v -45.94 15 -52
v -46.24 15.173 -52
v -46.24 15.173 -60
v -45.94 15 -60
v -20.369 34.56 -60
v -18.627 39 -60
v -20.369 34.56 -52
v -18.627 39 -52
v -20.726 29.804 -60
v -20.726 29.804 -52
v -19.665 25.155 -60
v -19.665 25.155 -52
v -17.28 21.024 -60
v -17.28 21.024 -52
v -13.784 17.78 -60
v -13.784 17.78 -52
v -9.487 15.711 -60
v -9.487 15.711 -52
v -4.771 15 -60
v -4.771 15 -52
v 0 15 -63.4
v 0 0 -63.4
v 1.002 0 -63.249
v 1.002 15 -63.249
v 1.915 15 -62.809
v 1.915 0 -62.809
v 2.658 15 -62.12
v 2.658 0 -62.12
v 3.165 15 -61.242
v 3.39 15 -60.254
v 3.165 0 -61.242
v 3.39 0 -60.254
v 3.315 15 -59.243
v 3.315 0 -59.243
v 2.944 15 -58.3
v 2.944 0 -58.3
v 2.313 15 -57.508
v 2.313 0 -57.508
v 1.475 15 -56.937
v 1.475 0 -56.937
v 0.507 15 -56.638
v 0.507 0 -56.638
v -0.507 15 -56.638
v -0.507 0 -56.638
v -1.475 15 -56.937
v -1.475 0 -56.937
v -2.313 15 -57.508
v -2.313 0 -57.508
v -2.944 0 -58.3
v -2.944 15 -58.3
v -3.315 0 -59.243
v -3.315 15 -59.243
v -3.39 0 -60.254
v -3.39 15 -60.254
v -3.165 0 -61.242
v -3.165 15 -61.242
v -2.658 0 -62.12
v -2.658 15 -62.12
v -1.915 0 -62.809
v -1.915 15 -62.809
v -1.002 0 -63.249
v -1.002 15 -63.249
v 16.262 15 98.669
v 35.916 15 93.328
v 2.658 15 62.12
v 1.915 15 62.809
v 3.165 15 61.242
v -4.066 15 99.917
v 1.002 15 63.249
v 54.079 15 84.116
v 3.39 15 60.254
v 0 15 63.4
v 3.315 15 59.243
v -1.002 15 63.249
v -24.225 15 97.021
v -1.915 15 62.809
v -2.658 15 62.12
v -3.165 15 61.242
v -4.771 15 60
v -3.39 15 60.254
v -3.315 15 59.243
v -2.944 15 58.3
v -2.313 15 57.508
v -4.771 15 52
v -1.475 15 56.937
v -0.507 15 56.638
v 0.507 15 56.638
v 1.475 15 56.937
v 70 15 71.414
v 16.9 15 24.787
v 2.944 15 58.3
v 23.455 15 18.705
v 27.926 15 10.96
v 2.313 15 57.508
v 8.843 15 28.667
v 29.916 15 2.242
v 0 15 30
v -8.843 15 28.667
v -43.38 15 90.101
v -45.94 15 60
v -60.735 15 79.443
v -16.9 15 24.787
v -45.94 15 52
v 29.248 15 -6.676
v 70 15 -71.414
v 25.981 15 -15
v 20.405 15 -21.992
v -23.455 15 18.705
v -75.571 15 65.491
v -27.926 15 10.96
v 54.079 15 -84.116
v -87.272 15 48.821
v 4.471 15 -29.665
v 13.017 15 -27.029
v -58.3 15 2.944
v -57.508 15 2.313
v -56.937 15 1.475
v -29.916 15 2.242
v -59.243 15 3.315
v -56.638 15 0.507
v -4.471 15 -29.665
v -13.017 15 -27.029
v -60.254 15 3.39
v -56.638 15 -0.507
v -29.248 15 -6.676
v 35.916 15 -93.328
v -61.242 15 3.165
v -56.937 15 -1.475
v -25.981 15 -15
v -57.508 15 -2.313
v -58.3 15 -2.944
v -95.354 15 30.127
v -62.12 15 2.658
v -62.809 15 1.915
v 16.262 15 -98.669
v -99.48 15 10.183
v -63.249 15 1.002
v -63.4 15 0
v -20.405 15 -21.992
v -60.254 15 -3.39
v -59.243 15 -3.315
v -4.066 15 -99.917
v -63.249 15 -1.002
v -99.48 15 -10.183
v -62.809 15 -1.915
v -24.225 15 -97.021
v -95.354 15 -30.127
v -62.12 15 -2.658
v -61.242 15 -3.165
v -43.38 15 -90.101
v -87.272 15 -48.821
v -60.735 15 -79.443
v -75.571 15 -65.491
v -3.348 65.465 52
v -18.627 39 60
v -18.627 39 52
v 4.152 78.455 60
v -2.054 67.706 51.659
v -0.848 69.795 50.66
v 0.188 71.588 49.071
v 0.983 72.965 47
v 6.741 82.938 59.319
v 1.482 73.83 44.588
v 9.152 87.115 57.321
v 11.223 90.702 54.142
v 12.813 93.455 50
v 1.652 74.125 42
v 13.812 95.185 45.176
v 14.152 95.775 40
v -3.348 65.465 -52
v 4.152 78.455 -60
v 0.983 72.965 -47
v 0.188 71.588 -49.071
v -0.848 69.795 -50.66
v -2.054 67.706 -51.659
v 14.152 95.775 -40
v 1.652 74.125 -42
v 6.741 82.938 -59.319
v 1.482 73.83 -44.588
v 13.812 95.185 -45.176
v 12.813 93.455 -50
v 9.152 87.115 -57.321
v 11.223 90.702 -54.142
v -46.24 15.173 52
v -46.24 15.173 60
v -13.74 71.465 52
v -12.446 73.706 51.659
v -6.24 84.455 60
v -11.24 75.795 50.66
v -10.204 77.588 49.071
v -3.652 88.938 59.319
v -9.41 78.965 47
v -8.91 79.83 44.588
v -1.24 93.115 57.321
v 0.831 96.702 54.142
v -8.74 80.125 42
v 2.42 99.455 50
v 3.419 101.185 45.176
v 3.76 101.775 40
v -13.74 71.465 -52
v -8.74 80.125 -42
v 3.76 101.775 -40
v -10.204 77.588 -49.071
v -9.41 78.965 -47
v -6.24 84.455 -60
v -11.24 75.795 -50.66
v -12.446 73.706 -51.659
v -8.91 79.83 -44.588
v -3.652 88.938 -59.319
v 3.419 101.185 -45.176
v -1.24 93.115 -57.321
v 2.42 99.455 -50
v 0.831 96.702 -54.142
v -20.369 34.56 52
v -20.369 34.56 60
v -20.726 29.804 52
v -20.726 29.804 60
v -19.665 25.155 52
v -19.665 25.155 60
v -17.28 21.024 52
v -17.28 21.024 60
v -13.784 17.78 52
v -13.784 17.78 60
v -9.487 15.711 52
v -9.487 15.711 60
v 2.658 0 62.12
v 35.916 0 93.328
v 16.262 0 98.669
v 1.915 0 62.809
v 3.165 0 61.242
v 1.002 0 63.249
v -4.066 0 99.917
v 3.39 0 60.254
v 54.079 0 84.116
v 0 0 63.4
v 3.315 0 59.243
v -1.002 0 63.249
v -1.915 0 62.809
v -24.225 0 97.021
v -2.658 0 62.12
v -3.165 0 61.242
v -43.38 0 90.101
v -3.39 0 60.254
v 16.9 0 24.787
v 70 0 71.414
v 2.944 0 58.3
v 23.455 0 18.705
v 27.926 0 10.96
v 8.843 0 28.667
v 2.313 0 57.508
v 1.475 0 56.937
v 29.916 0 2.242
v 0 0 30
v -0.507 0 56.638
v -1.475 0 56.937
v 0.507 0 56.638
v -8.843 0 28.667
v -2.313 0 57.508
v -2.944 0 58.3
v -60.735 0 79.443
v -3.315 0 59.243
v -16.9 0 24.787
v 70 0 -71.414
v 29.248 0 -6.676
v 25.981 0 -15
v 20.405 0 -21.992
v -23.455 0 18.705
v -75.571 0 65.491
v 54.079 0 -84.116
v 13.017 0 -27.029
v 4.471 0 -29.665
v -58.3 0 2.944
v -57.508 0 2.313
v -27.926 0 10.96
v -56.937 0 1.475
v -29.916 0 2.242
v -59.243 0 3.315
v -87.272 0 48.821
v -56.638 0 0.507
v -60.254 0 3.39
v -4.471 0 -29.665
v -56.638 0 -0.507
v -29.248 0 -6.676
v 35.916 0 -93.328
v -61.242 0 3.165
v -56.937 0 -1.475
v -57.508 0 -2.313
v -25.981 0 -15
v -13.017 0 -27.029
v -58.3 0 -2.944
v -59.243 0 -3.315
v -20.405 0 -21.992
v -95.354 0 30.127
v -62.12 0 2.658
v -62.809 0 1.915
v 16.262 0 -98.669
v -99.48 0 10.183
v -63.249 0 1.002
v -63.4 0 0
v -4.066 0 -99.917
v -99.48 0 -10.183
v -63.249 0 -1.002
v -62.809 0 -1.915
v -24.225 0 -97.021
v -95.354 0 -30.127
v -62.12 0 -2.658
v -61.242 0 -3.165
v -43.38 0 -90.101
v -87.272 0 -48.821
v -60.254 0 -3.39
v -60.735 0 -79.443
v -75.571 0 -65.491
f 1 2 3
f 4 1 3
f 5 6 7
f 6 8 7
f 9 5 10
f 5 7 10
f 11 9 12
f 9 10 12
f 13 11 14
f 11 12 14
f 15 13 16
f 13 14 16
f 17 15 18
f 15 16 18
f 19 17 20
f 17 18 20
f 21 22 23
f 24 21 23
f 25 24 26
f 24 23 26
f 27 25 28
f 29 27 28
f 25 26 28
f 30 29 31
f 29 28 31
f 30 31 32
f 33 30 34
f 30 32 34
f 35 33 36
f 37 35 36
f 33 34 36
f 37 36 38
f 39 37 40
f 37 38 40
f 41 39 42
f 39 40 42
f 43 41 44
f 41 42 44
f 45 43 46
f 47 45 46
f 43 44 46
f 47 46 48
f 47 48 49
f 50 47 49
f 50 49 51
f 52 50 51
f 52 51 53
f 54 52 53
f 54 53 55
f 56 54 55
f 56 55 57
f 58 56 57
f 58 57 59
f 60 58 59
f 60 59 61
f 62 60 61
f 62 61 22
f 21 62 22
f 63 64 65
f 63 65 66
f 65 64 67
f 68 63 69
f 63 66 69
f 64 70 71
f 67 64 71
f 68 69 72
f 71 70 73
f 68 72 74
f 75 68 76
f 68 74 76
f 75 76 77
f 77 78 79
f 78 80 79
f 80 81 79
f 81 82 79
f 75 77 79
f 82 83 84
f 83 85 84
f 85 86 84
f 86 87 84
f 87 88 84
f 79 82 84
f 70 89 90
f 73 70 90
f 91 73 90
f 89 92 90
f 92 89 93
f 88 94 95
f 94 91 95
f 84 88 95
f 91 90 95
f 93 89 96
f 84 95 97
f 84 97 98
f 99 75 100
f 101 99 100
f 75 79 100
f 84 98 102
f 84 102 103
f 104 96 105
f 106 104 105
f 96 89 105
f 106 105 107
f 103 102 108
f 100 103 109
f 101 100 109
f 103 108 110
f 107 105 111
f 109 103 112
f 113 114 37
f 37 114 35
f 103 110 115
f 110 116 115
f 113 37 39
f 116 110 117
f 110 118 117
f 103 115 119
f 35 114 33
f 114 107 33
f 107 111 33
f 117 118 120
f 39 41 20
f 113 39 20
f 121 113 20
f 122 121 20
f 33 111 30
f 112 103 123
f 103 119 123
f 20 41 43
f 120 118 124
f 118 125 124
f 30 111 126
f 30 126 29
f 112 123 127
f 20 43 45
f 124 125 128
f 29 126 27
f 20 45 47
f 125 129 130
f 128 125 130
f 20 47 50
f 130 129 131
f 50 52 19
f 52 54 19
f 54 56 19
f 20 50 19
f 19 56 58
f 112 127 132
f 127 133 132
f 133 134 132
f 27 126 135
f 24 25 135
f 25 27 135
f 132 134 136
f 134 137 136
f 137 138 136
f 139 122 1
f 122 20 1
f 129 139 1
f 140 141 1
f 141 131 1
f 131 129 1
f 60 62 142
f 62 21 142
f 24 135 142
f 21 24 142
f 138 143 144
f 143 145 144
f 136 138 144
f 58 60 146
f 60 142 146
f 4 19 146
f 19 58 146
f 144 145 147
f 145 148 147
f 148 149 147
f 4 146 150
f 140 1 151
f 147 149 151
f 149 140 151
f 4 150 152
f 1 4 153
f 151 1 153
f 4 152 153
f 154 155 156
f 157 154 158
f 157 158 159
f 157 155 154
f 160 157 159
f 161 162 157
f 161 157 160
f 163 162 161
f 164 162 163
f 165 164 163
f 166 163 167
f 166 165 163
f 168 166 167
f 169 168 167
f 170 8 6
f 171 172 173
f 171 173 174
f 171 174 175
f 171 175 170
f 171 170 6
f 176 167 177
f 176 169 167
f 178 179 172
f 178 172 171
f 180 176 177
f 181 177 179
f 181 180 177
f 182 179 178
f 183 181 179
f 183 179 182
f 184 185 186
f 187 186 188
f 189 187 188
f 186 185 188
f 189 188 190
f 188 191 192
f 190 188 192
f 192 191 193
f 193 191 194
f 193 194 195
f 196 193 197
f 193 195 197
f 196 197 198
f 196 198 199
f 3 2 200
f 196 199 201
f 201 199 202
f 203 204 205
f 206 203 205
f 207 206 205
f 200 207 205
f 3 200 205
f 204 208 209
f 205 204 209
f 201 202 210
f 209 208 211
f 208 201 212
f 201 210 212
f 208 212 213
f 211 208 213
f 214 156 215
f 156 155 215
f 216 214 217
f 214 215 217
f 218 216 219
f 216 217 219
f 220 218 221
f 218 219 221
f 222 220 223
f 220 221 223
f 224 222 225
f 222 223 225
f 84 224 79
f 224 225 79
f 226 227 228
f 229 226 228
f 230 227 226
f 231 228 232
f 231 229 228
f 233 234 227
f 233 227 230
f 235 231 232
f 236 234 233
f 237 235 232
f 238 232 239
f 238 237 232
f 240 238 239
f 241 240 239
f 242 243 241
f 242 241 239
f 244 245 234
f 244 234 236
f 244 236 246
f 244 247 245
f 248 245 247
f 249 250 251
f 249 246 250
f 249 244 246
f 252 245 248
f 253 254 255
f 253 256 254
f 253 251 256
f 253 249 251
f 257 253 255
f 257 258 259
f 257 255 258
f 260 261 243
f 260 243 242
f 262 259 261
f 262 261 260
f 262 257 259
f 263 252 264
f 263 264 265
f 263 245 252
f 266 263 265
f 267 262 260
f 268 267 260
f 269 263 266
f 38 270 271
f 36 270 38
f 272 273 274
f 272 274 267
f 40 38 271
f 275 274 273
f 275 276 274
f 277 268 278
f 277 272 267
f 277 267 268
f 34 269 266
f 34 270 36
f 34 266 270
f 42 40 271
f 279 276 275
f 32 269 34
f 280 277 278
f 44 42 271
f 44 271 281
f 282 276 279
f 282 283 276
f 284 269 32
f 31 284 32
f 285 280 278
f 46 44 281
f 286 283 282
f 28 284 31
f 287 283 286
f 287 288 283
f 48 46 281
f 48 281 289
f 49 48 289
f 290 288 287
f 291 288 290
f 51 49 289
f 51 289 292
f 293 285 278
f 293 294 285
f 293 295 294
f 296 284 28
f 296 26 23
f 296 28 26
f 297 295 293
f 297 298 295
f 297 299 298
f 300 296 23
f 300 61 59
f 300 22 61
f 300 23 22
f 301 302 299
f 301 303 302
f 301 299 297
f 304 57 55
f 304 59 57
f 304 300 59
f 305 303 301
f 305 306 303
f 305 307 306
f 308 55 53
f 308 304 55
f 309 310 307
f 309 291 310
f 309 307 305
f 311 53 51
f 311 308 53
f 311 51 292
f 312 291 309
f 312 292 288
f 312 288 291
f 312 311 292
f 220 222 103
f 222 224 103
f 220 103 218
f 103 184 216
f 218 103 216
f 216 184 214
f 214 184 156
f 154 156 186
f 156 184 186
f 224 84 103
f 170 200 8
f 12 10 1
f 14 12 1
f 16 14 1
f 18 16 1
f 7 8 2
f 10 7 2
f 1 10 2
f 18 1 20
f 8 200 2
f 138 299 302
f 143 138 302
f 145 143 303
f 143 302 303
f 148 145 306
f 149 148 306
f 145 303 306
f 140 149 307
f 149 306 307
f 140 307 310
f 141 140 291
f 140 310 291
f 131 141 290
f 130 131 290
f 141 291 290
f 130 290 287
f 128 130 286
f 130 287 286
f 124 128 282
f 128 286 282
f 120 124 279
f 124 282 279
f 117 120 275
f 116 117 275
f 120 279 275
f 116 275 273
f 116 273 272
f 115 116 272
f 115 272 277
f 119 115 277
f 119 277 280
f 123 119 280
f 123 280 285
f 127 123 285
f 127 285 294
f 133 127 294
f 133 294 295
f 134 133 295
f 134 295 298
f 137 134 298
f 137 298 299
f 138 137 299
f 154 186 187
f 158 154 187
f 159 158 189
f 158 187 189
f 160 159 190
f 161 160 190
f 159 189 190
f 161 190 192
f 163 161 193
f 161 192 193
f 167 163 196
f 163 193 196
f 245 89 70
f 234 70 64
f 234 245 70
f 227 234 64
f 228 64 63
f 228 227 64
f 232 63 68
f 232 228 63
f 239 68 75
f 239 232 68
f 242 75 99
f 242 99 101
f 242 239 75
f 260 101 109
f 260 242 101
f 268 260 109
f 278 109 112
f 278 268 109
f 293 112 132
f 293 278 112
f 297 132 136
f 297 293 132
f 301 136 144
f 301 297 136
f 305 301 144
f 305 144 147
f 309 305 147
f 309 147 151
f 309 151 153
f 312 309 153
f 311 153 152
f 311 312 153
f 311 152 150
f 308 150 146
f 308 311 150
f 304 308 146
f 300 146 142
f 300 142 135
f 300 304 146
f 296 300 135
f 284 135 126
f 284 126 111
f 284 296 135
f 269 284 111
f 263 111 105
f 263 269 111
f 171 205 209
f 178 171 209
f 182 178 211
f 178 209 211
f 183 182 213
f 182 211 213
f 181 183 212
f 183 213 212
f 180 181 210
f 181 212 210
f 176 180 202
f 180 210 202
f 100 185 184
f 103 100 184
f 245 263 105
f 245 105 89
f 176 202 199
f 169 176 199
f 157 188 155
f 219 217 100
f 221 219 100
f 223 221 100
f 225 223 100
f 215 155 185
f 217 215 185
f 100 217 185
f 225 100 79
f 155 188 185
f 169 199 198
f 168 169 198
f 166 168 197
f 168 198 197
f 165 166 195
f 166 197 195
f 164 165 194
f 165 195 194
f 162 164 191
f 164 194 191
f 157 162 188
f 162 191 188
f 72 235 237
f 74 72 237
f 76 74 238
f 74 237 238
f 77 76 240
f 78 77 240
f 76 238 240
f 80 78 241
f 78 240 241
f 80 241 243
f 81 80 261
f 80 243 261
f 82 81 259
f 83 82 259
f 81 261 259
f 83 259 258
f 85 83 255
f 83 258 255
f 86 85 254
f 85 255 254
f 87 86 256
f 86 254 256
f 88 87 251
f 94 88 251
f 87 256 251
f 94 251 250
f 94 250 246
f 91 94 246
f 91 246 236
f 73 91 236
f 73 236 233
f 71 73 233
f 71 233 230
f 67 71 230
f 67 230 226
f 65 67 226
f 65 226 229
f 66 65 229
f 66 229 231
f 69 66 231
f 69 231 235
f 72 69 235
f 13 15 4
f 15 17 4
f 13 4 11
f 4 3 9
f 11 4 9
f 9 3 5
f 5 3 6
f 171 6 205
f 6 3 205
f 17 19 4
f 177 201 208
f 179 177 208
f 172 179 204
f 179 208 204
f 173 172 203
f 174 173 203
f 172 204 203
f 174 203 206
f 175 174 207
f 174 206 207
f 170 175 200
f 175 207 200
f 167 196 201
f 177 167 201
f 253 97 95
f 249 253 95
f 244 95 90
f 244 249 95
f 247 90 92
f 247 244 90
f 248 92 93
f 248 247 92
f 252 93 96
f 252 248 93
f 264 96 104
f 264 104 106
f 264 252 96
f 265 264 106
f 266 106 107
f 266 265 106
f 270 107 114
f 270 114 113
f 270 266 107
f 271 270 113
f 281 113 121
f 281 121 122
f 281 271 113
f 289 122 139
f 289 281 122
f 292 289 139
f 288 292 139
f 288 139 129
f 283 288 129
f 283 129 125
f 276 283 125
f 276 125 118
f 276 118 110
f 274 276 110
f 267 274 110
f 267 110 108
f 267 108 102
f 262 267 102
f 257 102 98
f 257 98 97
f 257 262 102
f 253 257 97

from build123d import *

# Parameters (mm, degrees)
SKETCH_9_R               = 30
EXTRUDE_3_DEPTH          = 15
EXTRUDE_4_DEPTH          = 12
FILLET_2_R               = 16
HOLE_WIZARD_M8_2_D       = 6.8
HOLE_WIZARD_M8_2_DEPTH   = 15
PATTERN_CIRCULAR_2_COUNT = 4


with BuildPart() as part:
    # 草图9 → 凸台-拉伸3 (new body)
    with BuildSketch(Plane(origin=(0, 0, 0), x_dir=(1, 0, 0), z_dir=(0, 1, 0))):
        with BuildLine():
            Line((70, 71.414284285), (70, -71.414284285))
            ThreePointArc((70, -71.414284285), (-100, 0), (70, 71.414284285))
        make_face()
        with Locations(Location((0, 0, 0), (0, 0, 270))):
            Circle(SKETCH_9_R, mode=Mode.SUBTRACT)
    extrude(amount=EXTRUDE_3_DEPTH)

    # 草图11 → 凸台-拉伸4 (add)
    with BuildSketch(Plane(origin=(-41.25, 23.815698604, 0), x_dir=(0, 0, 1), z_dir=(-0.8660254037844398, 0.499999999999998, 0))):
        with BuildLine():
            Line((-60, -9.97981973), (-60, 70.02018027))
            ThreePointArc((-60, 70.02018027), (-54.142135624, 84.162315894), (-40, 90.02018027))
            Line((-40, 90.02018027), (40, 90.02018027))
            ThreePointArc((40, 90.02018027), (54.142135624, 84.162315894), (60, 70.02018027))
            Line((60, 70.02018027), (60, -9.97981973))
            Line((60, -9.97981973), (52, -9.97981973))
            Line((52, -9.97981973), (52, 55.02018027))
            ThreePointArc((52, 55.02018027), (49.071067812, 62.091248082), (42, 65.02018027))
            Line((42, 65.02018027), (-42, 65.02018027))
            ThreePointArc((-42, 65.02018027), (-49.071067812, 62.091248082), (-52, 55.02018027))
            Line((-52, 55.02018027), (-52, -9.97981973))
            Line((-52, -9.97981973), (-60, -9.97981973))
        make_face()
    extrude(amount=-EXTRUDE_4_DEPTH)

    # 圆角2
    fillet_2_edges = [part.edges().sort_by_distance(p)[0] for p in [
        (-32.483339502, 15, -56),
        (-32.483339502, 15, 56),
    ]]
    fillet(fillet_2_edges, radius=FILLET_2_R)

    # M8 螺纹孔2
    with Locations(Plane(origin=(0, 15, 0), x_dir=(1, 0, 0), z_dir=(0, 1, 0))):
        with Locations((-60, 0)):
            hole_wizard_m8_2 = Hole(HOLE_WIZARD_M8_2_D / 2, depth=HOLE_WIZARD_M8_2_DEPTH)

    # 阵列(圆周)2: M8 螺纹孔2 ×4 about axis, 1 skipped
    pattern_circular_2_axis = Axis((0, 0, 0), (0, 1, 0))
    add([hole_wizard_m8_2.rotate(pattern_circular_2_axis, i * 360 / PATTERN_CIRCULAR_2_COUNT) for i in range(1, PATTERN_CIRCULAR_2_COUNT) if i not in (2,)], mode=Mode.SUBTRACT)


solid = part.part
